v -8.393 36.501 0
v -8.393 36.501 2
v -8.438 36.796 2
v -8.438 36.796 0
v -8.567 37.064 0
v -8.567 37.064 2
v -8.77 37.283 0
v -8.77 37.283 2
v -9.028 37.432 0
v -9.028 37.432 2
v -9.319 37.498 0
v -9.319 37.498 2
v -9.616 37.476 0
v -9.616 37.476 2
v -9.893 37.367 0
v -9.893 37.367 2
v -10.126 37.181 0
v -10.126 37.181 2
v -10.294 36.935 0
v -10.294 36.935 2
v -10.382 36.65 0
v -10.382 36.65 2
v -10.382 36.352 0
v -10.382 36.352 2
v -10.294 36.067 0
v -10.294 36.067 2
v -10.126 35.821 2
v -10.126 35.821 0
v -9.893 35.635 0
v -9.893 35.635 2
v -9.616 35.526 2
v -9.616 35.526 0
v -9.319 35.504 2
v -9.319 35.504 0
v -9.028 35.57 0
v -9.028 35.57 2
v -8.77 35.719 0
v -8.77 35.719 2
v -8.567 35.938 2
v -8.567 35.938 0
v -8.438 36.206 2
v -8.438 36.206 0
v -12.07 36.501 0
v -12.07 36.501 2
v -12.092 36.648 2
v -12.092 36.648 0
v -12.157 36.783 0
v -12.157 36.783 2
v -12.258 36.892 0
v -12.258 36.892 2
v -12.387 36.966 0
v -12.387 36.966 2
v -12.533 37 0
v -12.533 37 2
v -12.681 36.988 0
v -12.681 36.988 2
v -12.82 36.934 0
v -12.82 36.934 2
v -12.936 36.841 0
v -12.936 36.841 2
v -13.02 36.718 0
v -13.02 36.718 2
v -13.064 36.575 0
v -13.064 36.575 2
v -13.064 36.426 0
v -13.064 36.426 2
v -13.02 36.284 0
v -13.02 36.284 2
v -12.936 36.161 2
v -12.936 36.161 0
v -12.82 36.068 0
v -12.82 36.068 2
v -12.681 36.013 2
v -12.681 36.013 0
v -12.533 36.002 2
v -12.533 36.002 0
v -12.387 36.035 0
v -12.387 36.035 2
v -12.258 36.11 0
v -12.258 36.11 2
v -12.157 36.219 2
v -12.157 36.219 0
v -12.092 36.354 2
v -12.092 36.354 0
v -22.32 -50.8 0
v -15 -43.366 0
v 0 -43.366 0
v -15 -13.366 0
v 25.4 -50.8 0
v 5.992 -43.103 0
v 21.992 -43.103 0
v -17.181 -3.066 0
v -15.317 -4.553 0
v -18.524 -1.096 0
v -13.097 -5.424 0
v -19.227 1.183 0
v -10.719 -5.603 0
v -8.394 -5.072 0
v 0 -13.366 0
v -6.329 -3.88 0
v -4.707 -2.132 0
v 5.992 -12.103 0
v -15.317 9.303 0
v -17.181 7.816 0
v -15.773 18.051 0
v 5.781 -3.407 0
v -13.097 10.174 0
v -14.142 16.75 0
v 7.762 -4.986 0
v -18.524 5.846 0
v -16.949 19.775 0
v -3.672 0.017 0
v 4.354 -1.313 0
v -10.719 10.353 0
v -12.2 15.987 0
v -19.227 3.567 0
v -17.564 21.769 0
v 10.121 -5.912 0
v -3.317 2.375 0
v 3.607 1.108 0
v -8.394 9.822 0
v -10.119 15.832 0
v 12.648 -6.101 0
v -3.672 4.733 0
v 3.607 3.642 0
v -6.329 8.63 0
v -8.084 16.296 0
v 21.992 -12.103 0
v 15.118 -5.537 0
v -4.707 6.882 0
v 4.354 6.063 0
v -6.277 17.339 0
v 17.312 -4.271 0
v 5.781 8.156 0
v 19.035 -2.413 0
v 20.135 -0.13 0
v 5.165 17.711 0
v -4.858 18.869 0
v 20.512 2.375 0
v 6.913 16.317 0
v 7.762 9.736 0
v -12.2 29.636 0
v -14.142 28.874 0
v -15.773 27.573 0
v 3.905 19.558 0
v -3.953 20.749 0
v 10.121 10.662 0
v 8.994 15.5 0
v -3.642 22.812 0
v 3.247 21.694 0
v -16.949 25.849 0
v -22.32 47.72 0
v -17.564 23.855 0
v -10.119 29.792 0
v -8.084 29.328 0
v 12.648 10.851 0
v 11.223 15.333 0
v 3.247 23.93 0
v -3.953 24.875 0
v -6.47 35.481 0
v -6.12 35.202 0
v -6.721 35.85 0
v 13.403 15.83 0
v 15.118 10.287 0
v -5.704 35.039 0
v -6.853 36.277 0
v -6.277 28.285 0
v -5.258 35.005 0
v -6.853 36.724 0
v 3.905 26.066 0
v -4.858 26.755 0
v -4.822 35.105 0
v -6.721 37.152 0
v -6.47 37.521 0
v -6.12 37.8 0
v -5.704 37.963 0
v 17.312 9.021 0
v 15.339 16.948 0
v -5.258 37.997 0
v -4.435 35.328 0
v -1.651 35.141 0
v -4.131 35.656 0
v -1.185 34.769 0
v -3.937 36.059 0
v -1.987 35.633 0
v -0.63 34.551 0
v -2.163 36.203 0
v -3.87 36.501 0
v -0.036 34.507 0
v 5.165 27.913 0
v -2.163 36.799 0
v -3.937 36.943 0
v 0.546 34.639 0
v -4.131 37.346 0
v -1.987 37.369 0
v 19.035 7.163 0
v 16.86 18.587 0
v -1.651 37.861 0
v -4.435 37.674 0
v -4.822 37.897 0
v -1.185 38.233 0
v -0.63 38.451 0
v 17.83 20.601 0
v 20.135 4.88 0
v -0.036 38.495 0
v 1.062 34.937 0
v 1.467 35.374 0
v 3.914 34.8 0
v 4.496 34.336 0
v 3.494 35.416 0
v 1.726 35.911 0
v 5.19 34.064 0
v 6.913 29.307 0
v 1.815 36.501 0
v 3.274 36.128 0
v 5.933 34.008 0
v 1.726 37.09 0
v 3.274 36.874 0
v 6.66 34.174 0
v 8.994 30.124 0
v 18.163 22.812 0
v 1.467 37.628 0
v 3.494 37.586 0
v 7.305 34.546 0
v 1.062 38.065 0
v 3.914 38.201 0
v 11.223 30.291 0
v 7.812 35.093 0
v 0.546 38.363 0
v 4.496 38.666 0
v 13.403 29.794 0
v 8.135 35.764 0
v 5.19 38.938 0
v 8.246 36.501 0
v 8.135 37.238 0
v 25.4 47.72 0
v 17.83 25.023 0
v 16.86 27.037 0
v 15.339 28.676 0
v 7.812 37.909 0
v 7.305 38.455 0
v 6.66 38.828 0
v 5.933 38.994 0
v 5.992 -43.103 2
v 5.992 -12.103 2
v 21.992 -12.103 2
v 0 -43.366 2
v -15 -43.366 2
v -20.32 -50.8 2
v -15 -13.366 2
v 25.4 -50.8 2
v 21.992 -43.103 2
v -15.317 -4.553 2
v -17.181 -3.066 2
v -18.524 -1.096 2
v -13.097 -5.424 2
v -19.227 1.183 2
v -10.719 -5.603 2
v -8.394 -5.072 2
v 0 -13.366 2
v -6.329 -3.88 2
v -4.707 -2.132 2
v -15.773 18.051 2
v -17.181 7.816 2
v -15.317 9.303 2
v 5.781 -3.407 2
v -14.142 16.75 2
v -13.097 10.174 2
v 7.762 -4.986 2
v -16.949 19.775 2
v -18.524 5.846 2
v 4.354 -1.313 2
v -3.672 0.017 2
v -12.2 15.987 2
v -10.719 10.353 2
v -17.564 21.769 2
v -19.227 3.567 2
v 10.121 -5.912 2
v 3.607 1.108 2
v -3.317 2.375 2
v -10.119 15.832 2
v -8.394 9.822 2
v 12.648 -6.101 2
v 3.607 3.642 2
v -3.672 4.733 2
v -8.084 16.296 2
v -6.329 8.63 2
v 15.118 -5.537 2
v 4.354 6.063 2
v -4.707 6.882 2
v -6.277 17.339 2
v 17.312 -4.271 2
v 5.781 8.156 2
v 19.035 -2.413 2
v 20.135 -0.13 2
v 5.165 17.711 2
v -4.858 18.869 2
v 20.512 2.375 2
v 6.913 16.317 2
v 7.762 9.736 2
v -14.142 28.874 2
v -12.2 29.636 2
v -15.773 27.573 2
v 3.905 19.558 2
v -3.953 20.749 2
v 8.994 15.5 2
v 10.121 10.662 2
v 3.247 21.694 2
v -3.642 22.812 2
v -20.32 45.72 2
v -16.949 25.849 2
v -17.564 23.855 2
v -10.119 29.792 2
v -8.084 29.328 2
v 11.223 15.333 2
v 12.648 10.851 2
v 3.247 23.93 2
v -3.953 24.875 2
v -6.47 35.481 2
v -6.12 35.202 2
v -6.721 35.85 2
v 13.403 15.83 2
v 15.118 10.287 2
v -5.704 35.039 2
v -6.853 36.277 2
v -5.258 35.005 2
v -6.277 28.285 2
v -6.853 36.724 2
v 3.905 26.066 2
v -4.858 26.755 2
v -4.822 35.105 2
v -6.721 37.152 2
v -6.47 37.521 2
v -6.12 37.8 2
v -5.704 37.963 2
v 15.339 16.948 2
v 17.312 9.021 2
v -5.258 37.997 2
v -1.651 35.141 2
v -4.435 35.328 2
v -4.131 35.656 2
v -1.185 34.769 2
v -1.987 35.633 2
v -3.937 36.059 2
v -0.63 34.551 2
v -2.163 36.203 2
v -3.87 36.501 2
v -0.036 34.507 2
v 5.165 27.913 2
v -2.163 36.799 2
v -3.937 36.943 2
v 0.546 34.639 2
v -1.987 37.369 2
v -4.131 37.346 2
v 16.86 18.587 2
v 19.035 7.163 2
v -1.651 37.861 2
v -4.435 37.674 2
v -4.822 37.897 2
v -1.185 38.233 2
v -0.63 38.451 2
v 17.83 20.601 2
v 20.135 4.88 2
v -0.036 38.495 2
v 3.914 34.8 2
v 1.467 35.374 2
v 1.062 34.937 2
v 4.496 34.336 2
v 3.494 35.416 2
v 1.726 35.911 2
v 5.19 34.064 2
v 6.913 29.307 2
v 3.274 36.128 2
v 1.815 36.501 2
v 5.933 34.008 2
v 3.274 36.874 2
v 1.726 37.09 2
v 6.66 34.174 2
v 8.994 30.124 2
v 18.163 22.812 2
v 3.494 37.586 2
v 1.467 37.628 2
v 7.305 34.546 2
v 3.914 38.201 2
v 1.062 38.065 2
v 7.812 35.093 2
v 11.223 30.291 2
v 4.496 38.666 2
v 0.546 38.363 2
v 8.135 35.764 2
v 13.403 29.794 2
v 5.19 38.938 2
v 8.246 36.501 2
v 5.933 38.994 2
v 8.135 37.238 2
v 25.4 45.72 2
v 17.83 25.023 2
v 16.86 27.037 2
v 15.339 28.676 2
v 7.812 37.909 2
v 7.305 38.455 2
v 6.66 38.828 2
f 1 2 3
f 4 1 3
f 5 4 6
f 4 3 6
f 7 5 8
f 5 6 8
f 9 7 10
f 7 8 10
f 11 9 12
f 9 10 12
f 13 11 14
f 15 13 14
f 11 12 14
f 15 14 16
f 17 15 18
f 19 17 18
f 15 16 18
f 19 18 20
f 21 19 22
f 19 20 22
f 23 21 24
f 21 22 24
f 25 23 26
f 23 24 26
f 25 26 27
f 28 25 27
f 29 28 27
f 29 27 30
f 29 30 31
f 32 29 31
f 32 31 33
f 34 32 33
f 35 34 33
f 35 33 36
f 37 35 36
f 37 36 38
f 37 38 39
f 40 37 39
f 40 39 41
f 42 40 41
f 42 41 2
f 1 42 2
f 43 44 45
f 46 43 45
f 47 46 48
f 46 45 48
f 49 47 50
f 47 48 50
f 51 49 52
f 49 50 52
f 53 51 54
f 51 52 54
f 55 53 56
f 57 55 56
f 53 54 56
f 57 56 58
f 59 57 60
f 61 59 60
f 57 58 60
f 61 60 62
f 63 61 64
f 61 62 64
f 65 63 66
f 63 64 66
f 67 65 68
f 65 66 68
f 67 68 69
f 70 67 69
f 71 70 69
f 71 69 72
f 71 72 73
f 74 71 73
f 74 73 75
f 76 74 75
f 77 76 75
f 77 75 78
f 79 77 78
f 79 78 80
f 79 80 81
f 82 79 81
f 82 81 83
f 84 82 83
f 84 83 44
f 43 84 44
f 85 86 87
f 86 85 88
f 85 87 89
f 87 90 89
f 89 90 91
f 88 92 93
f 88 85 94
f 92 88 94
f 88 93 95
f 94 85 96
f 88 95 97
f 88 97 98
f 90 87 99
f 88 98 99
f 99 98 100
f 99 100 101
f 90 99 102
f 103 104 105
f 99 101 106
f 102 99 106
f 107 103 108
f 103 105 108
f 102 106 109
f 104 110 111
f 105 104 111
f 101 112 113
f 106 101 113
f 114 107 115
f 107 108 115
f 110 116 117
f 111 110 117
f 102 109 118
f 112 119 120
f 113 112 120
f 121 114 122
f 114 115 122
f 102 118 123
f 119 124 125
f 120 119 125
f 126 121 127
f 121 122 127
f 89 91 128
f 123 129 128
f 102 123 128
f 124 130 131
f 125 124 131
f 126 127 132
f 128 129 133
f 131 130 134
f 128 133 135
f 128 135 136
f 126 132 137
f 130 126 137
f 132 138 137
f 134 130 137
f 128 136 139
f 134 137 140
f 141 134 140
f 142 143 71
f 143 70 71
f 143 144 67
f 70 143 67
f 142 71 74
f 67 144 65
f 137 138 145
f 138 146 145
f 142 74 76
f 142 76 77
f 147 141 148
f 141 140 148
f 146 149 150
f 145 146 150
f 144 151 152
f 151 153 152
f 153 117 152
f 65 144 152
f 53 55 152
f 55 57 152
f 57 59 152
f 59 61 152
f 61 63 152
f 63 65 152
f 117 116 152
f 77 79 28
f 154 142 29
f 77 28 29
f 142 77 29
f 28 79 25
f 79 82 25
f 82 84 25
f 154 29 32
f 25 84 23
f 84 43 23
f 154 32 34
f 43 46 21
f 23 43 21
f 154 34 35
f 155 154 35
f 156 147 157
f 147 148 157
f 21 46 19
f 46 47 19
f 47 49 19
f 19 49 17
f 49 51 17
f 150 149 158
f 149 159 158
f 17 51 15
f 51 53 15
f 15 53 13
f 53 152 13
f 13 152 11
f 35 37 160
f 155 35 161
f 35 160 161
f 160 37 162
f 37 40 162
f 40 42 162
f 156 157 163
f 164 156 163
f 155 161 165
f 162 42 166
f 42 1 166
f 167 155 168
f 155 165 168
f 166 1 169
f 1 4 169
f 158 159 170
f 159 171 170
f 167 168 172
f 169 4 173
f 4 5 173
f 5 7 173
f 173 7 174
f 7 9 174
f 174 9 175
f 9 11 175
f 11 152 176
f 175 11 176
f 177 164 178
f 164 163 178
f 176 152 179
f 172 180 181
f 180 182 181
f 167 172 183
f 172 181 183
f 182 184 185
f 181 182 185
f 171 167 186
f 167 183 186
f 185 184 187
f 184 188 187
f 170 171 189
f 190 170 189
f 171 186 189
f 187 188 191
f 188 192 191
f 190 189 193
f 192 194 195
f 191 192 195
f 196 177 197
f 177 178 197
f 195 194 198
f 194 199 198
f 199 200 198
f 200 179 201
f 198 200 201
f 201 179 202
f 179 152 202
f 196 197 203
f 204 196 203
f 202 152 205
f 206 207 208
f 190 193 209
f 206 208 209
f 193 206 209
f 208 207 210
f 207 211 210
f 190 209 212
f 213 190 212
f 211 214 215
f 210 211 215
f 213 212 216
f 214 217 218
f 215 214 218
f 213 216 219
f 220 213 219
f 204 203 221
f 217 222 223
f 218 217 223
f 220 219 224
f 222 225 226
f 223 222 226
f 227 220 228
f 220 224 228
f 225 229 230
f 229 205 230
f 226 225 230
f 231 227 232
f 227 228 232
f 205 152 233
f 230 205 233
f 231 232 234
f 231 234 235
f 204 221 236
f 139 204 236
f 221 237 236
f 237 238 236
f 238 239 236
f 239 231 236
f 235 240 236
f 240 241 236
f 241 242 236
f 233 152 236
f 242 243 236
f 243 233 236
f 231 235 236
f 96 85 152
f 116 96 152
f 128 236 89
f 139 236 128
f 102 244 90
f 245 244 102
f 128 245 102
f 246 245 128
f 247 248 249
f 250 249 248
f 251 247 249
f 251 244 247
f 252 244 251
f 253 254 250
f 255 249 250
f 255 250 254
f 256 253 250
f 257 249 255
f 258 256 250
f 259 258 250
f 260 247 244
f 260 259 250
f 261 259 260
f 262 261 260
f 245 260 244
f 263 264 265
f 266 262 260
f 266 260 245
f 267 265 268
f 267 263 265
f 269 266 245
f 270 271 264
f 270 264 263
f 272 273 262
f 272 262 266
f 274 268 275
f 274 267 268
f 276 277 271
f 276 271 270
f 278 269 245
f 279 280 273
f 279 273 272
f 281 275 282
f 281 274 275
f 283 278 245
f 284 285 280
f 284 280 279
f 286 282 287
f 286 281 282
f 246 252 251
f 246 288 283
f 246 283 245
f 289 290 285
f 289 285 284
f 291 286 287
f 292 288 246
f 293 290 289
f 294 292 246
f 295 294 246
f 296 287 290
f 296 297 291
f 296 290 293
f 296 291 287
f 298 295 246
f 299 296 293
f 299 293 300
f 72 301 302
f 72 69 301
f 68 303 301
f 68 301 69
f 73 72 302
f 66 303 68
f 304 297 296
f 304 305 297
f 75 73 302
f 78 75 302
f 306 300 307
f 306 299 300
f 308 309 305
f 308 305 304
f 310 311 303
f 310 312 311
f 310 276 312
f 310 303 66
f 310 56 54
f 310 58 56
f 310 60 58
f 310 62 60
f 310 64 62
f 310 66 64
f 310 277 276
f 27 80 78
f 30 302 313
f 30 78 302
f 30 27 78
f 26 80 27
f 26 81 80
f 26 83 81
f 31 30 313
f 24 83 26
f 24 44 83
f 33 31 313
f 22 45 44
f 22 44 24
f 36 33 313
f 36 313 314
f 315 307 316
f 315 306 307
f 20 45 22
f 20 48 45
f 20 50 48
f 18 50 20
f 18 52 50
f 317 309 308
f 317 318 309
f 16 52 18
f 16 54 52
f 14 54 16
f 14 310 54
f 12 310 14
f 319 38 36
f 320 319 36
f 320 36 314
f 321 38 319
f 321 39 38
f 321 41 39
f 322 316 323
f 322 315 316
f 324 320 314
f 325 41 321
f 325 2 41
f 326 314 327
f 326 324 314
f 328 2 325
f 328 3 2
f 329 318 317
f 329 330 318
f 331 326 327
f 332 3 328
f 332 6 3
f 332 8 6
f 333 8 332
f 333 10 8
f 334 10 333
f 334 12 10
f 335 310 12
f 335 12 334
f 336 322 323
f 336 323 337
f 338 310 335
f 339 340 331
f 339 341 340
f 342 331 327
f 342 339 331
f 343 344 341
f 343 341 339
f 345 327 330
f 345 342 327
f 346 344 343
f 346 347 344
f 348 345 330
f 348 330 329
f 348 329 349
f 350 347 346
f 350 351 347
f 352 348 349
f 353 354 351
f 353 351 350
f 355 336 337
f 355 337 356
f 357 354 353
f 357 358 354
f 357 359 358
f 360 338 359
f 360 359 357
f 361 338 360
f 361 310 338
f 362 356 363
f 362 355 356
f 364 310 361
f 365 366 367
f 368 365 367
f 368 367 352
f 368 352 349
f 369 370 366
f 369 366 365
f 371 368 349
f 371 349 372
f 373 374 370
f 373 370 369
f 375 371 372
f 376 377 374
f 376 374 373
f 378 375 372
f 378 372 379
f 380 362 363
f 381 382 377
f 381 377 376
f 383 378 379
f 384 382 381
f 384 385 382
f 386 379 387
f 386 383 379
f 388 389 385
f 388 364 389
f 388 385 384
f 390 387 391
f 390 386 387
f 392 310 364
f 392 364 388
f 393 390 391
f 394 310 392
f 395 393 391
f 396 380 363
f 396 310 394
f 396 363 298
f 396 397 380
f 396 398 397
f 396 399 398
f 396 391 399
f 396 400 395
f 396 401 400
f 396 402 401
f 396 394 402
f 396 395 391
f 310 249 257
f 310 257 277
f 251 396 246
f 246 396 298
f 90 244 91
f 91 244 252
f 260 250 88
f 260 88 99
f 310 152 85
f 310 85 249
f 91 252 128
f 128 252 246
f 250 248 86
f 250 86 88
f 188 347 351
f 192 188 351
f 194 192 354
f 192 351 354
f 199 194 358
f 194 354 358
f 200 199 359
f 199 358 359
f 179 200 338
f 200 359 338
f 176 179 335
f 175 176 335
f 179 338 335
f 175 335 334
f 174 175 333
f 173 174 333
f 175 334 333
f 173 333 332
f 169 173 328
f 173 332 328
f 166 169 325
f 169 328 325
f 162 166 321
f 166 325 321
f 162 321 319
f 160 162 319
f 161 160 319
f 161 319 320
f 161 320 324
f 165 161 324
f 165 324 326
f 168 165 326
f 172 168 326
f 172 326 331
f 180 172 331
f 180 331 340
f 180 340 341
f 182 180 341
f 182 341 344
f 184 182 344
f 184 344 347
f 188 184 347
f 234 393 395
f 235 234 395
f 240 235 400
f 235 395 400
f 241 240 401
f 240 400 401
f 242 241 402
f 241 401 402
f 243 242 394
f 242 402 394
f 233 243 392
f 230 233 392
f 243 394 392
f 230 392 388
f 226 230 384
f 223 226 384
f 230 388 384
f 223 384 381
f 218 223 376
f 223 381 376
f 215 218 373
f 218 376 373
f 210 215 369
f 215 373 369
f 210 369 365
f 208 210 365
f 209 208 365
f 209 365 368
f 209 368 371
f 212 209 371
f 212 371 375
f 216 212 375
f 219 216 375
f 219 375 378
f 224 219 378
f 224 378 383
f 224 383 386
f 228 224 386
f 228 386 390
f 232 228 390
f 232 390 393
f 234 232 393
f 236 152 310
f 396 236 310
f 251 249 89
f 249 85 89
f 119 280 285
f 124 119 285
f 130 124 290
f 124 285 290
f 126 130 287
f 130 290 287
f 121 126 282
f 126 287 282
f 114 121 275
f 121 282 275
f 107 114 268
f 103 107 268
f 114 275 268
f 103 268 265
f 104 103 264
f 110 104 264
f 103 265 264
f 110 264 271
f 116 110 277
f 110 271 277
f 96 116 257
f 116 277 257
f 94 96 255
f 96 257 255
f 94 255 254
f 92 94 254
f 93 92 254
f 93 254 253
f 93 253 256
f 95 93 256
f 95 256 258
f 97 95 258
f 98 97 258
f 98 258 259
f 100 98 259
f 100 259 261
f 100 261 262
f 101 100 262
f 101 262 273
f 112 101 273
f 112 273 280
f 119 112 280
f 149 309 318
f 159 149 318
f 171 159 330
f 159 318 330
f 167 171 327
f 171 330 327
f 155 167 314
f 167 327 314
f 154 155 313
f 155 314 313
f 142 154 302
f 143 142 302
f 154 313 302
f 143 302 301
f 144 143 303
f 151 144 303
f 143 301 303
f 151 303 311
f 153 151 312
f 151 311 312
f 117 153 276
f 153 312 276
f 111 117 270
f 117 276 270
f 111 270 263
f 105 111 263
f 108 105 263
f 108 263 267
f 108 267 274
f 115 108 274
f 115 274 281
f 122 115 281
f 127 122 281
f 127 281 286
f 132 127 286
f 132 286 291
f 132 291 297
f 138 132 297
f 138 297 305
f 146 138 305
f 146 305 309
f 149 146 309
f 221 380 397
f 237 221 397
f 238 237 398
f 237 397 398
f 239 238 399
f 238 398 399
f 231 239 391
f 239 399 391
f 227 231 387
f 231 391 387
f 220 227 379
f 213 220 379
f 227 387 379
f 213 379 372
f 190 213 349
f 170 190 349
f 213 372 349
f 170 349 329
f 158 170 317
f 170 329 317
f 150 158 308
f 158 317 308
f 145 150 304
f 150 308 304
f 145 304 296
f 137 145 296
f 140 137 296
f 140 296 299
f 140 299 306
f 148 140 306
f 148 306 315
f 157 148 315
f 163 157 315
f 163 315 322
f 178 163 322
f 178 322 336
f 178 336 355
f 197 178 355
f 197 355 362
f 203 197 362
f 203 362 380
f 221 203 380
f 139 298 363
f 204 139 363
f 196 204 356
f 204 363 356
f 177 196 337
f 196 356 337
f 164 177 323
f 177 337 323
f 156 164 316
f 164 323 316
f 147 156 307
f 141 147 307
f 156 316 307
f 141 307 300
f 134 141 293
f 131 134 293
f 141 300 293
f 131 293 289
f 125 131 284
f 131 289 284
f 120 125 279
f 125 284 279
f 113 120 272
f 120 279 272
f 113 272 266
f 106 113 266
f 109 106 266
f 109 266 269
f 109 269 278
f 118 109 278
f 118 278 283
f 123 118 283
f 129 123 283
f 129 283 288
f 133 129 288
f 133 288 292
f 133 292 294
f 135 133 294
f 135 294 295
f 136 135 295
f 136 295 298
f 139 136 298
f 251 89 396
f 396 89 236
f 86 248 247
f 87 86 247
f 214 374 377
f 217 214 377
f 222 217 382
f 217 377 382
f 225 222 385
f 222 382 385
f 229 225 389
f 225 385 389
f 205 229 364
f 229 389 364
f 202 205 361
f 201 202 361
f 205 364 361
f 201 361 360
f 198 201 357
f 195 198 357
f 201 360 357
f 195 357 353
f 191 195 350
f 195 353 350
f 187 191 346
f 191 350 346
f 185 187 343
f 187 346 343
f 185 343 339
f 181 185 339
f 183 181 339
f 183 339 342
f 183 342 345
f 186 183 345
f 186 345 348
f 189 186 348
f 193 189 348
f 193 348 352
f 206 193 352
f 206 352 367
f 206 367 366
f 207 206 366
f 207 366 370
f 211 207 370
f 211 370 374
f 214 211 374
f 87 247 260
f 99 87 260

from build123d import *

# Parameters (mm, degrees)
F0_W        = 50.8
F0_H        = 101.6
F1_DEPTH    = 2
F2_T1_DEPTH = 127.7282991577
F2_T3_DEPTH = 76.9282991577
F3_W        = 15
F3_H        = 30
F3_W_2      = 16
F3_H_2      = 31
F3_R        = 8.5
F3_R_2      = 8
F3_R_3      = 7
F3_R_4      = 7.5
F3_R_5      = 2.5
F3_R_6      = 2
F3_R_7      = 1.5
F3_R_8      = 1
F3_R_9      = 0.5
F4_DEPTH    = 25.4


# Not quite as in the source:
# - a fillet or chamfer that OpenCascade refuses, or shapes differently, is made with other operations: its cross-section is extruded or revolved along the edge and cut away or added


with BuildPart() as f1:
    # F0 (on Top) → F1 (new body)
    with BuildSketch(Plane.XY):
        Rectangle(F0_W, F0_H)
    extrude(amount=F1_DEPTH)

    # F2: chamfer of 5.08 on 2 edges, made by hand

    # F2_s2 → F2_t1 (cut)
    with BuildSketch(Plane.XZ.offset(-63.8641495789)):
        Polygon((-25.4, -3.08), (-20.32, 2), (-25.4, 2), align=None)
    extrude(amount=F2_T1_DEPTH, mode=Mode.SUBTRACT)

    # F2_s4 → F2_t3 (cut)
    with BuildSketch(Plane.YZ.offset(-38.4641495789)):
        Polygon((50.8, -3.08), (45.72, 2), (50.8, 2), align=None)
    extrude(amount=F2_T3_DEPTH, mode=Mode.SUBTRACT)

    # F3 (on face) → F4 (cut)
    with BuildSketch(Plane.XY.offset(2)):
        with Locations((-7.5, -28.3660255373)):
            Rectangle(F3_W, F3_H)
        with Locations((13.9922183007, -27.6028160006)):
            Rectangle(F3_W_2, F3_H_2)
        with Locations((12.0123671368, 2.37495685)):
            Circle(F3_R)
        with Locations((-11.3166794181, 2.37495685)):
            Circle(F3_R_2)
        with Locations((-10.6418682262, 22.8119734675)):
            Circle(F3_R_3)
        with Locations((10.6627577916, 22.8119734675)):
            Circle(F3_R_4)
        with Locations((5.7463059202, 36.5009196103)):
            Circle(F3_R_5)
        with Locations((-0.1850809494, 36.5009196103)):
            Circle(F3_R_6)
        with Locations((-5.3699584678, 36.5009196103)):
            Circle(F3_R_7)
        with Locations((-9.3934237957, 36.5009196103)):
            Circle(F3_R_8)
        with Locations((-12.5698875636, 36.5009196103)):
            Circle(F3_R_9)
    extrude(amount=-F4_DEPTH, mode=Mode.SUBTRACT)


solid = f1.part
